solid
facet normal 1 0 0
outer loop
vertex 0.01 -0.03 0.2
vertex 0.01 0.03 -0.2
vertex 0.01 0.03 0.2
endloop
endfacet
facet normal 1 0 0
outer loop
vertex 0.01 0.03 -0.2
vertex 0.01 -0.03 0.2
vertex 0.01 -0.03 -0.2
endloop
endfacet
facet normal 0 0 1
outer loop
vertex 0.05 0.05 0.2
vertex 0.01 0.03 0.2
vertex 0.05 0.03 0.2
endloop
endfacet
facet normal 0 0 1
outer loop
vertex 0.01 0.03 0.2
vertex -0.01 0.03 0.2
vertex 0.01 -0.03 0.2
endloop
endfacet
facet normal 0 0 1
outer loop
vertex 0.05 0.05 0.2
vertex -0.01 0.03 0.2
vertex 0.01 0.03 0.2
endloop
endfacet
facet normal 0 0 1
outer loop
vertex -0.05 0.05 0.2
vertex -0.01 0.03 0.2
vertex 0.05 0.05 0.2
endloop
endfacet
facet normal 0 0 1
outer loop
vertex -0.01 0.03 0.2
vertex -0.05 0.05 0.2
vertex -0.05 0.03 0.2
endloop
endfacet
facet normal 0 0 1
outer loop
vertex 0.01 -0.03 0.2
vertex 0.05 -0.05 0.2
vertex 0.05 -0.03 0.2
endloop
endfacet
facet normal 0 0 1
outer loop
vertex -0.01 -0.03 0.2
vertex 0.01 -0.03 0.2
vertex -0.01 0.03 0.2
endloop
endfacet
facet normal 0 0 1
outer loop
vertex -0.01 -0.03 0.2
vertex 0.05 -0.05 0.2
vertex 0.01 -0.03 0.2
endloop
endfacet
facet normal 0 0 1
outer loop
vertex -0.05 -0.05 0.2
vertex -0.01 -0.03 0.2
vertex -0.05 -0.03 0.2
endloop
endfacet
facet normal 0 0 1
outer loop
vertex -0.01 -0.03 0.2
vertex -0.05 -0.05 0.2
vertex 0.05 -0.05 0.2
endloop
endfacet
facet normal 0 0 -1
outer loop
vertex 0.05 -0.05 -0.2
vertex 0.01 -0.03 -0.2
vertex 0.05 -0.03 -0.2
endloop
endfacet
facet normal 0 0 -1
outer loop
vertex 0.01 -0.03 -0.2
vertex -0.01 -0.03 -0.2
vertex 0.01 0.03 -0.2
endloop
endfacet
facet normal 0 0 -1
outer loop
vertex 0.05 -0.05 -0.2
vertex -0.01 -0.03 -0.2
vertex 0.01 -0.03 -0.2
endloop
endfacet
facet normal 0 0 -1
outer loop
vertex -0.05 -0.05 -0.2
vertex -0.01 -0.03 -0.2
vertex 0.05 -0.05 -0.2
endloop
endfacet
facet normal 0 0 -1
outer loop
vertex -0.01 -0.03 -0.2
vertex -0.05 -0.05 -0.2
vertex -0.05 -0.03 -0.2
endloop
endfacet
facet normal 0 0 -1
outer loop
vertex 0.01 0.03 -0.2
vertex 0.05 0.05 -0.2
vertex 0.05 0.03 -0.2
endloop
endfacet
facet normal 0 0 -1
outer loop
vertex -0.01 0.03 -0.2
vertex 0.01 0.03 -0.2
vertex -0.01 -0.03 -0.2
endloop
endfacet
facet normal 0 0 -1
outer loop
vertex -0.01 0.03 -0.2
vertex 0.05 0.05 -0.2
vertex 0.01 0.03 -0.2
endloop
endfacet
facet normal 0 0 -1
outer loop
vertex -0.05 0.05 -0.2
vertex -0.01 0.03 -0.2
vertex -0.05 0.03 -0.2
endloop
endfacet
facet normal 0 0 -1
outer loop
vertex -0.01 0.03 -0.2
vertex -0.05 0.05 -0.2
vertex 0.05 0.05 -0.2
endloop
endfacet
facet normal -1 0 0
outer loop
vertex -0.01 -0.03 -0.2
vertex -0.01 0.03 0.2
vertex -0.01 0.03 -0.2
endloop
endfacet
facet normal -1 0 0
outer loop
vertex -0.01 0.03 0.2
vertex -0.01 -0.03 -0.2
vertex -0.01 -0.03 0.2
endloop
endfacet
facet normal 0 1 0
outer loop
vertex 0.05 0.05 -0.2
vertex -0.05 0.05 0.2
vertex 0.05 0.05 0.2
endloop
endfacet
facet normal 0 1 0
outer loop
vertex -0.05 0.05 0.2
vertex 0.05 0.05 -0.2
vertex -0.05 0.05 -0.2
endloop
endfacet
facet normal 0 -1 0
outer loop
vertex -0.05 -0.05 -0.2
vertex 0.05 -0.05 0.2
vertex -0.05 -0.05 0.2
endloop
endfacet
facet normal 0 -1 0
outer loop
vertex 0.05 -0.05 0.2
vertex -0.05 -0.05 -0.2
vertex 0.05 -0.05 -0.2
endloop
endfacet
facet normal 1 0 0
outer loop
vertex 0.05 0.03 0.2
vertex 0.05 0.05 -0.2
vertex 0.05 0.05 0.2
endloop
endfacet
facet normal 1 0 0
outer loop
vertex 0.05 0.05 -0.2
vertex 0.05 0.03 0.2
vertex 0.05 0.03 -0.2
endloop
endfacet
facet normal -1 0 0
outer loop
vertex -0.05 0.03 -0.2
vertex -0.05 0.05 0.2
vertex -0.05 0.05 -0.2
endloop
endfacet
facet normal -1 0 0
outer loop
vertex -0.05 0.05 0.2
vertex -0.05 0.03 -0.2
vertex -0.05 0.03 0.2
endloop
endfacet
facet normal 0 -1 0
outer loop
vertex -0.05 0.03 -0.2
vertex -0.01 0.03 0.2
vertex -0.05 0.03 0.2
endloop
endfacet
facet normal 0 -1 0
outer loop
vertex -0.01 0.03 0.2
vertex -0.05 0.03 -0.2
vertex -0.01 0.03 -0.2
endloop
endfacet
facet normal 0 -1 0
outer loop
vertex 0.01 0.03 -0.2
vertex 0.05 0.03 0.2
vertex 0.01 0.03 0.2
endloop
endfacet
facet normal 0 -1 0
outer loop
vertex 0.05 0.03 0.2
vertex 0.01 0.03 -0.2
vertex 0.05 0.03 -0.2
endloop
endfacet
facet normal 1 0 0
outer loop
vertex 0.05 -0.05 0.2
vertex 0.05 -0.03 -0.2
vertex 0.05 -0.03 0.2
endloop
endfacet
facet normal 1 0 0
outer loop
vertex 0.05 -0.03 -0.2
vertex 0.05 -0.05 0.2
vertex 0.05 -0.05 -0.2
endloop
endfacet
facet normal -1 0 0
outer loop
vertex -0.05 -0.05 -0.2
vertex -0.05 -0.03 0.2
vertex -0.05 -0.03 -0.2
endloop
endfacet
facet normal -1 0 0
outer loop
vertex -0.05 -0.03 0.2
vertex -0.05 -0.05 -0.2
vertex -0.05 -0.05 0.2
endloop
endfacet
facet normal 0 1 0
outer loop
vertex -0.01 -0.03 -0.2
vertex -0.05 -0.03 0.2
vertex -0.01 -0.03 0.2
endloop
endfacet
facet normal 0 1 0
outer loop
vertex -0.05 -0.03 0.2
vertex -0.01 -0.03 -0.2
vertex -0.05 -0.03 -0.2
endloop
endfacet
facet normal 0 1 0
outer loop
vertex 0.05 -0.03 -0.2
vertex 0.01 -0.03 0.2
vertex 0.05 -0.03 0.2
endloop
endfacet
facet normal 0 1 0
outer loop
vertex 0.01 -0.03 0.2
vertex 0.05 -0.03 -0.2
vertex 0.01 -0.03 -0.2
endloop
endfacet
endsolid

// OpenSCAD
module Beam_T(){
    scale([0.1,0.1,0.1])
    color("#CCCCCC"){
cube([0.2,1,4], center =true);

translate([0,0.4,0])
cube([1,0.2,4], center =true);

translate([0,-0.4,0])
cube([1,0.2,4], center =true);
        }
    }

Beam_T();
